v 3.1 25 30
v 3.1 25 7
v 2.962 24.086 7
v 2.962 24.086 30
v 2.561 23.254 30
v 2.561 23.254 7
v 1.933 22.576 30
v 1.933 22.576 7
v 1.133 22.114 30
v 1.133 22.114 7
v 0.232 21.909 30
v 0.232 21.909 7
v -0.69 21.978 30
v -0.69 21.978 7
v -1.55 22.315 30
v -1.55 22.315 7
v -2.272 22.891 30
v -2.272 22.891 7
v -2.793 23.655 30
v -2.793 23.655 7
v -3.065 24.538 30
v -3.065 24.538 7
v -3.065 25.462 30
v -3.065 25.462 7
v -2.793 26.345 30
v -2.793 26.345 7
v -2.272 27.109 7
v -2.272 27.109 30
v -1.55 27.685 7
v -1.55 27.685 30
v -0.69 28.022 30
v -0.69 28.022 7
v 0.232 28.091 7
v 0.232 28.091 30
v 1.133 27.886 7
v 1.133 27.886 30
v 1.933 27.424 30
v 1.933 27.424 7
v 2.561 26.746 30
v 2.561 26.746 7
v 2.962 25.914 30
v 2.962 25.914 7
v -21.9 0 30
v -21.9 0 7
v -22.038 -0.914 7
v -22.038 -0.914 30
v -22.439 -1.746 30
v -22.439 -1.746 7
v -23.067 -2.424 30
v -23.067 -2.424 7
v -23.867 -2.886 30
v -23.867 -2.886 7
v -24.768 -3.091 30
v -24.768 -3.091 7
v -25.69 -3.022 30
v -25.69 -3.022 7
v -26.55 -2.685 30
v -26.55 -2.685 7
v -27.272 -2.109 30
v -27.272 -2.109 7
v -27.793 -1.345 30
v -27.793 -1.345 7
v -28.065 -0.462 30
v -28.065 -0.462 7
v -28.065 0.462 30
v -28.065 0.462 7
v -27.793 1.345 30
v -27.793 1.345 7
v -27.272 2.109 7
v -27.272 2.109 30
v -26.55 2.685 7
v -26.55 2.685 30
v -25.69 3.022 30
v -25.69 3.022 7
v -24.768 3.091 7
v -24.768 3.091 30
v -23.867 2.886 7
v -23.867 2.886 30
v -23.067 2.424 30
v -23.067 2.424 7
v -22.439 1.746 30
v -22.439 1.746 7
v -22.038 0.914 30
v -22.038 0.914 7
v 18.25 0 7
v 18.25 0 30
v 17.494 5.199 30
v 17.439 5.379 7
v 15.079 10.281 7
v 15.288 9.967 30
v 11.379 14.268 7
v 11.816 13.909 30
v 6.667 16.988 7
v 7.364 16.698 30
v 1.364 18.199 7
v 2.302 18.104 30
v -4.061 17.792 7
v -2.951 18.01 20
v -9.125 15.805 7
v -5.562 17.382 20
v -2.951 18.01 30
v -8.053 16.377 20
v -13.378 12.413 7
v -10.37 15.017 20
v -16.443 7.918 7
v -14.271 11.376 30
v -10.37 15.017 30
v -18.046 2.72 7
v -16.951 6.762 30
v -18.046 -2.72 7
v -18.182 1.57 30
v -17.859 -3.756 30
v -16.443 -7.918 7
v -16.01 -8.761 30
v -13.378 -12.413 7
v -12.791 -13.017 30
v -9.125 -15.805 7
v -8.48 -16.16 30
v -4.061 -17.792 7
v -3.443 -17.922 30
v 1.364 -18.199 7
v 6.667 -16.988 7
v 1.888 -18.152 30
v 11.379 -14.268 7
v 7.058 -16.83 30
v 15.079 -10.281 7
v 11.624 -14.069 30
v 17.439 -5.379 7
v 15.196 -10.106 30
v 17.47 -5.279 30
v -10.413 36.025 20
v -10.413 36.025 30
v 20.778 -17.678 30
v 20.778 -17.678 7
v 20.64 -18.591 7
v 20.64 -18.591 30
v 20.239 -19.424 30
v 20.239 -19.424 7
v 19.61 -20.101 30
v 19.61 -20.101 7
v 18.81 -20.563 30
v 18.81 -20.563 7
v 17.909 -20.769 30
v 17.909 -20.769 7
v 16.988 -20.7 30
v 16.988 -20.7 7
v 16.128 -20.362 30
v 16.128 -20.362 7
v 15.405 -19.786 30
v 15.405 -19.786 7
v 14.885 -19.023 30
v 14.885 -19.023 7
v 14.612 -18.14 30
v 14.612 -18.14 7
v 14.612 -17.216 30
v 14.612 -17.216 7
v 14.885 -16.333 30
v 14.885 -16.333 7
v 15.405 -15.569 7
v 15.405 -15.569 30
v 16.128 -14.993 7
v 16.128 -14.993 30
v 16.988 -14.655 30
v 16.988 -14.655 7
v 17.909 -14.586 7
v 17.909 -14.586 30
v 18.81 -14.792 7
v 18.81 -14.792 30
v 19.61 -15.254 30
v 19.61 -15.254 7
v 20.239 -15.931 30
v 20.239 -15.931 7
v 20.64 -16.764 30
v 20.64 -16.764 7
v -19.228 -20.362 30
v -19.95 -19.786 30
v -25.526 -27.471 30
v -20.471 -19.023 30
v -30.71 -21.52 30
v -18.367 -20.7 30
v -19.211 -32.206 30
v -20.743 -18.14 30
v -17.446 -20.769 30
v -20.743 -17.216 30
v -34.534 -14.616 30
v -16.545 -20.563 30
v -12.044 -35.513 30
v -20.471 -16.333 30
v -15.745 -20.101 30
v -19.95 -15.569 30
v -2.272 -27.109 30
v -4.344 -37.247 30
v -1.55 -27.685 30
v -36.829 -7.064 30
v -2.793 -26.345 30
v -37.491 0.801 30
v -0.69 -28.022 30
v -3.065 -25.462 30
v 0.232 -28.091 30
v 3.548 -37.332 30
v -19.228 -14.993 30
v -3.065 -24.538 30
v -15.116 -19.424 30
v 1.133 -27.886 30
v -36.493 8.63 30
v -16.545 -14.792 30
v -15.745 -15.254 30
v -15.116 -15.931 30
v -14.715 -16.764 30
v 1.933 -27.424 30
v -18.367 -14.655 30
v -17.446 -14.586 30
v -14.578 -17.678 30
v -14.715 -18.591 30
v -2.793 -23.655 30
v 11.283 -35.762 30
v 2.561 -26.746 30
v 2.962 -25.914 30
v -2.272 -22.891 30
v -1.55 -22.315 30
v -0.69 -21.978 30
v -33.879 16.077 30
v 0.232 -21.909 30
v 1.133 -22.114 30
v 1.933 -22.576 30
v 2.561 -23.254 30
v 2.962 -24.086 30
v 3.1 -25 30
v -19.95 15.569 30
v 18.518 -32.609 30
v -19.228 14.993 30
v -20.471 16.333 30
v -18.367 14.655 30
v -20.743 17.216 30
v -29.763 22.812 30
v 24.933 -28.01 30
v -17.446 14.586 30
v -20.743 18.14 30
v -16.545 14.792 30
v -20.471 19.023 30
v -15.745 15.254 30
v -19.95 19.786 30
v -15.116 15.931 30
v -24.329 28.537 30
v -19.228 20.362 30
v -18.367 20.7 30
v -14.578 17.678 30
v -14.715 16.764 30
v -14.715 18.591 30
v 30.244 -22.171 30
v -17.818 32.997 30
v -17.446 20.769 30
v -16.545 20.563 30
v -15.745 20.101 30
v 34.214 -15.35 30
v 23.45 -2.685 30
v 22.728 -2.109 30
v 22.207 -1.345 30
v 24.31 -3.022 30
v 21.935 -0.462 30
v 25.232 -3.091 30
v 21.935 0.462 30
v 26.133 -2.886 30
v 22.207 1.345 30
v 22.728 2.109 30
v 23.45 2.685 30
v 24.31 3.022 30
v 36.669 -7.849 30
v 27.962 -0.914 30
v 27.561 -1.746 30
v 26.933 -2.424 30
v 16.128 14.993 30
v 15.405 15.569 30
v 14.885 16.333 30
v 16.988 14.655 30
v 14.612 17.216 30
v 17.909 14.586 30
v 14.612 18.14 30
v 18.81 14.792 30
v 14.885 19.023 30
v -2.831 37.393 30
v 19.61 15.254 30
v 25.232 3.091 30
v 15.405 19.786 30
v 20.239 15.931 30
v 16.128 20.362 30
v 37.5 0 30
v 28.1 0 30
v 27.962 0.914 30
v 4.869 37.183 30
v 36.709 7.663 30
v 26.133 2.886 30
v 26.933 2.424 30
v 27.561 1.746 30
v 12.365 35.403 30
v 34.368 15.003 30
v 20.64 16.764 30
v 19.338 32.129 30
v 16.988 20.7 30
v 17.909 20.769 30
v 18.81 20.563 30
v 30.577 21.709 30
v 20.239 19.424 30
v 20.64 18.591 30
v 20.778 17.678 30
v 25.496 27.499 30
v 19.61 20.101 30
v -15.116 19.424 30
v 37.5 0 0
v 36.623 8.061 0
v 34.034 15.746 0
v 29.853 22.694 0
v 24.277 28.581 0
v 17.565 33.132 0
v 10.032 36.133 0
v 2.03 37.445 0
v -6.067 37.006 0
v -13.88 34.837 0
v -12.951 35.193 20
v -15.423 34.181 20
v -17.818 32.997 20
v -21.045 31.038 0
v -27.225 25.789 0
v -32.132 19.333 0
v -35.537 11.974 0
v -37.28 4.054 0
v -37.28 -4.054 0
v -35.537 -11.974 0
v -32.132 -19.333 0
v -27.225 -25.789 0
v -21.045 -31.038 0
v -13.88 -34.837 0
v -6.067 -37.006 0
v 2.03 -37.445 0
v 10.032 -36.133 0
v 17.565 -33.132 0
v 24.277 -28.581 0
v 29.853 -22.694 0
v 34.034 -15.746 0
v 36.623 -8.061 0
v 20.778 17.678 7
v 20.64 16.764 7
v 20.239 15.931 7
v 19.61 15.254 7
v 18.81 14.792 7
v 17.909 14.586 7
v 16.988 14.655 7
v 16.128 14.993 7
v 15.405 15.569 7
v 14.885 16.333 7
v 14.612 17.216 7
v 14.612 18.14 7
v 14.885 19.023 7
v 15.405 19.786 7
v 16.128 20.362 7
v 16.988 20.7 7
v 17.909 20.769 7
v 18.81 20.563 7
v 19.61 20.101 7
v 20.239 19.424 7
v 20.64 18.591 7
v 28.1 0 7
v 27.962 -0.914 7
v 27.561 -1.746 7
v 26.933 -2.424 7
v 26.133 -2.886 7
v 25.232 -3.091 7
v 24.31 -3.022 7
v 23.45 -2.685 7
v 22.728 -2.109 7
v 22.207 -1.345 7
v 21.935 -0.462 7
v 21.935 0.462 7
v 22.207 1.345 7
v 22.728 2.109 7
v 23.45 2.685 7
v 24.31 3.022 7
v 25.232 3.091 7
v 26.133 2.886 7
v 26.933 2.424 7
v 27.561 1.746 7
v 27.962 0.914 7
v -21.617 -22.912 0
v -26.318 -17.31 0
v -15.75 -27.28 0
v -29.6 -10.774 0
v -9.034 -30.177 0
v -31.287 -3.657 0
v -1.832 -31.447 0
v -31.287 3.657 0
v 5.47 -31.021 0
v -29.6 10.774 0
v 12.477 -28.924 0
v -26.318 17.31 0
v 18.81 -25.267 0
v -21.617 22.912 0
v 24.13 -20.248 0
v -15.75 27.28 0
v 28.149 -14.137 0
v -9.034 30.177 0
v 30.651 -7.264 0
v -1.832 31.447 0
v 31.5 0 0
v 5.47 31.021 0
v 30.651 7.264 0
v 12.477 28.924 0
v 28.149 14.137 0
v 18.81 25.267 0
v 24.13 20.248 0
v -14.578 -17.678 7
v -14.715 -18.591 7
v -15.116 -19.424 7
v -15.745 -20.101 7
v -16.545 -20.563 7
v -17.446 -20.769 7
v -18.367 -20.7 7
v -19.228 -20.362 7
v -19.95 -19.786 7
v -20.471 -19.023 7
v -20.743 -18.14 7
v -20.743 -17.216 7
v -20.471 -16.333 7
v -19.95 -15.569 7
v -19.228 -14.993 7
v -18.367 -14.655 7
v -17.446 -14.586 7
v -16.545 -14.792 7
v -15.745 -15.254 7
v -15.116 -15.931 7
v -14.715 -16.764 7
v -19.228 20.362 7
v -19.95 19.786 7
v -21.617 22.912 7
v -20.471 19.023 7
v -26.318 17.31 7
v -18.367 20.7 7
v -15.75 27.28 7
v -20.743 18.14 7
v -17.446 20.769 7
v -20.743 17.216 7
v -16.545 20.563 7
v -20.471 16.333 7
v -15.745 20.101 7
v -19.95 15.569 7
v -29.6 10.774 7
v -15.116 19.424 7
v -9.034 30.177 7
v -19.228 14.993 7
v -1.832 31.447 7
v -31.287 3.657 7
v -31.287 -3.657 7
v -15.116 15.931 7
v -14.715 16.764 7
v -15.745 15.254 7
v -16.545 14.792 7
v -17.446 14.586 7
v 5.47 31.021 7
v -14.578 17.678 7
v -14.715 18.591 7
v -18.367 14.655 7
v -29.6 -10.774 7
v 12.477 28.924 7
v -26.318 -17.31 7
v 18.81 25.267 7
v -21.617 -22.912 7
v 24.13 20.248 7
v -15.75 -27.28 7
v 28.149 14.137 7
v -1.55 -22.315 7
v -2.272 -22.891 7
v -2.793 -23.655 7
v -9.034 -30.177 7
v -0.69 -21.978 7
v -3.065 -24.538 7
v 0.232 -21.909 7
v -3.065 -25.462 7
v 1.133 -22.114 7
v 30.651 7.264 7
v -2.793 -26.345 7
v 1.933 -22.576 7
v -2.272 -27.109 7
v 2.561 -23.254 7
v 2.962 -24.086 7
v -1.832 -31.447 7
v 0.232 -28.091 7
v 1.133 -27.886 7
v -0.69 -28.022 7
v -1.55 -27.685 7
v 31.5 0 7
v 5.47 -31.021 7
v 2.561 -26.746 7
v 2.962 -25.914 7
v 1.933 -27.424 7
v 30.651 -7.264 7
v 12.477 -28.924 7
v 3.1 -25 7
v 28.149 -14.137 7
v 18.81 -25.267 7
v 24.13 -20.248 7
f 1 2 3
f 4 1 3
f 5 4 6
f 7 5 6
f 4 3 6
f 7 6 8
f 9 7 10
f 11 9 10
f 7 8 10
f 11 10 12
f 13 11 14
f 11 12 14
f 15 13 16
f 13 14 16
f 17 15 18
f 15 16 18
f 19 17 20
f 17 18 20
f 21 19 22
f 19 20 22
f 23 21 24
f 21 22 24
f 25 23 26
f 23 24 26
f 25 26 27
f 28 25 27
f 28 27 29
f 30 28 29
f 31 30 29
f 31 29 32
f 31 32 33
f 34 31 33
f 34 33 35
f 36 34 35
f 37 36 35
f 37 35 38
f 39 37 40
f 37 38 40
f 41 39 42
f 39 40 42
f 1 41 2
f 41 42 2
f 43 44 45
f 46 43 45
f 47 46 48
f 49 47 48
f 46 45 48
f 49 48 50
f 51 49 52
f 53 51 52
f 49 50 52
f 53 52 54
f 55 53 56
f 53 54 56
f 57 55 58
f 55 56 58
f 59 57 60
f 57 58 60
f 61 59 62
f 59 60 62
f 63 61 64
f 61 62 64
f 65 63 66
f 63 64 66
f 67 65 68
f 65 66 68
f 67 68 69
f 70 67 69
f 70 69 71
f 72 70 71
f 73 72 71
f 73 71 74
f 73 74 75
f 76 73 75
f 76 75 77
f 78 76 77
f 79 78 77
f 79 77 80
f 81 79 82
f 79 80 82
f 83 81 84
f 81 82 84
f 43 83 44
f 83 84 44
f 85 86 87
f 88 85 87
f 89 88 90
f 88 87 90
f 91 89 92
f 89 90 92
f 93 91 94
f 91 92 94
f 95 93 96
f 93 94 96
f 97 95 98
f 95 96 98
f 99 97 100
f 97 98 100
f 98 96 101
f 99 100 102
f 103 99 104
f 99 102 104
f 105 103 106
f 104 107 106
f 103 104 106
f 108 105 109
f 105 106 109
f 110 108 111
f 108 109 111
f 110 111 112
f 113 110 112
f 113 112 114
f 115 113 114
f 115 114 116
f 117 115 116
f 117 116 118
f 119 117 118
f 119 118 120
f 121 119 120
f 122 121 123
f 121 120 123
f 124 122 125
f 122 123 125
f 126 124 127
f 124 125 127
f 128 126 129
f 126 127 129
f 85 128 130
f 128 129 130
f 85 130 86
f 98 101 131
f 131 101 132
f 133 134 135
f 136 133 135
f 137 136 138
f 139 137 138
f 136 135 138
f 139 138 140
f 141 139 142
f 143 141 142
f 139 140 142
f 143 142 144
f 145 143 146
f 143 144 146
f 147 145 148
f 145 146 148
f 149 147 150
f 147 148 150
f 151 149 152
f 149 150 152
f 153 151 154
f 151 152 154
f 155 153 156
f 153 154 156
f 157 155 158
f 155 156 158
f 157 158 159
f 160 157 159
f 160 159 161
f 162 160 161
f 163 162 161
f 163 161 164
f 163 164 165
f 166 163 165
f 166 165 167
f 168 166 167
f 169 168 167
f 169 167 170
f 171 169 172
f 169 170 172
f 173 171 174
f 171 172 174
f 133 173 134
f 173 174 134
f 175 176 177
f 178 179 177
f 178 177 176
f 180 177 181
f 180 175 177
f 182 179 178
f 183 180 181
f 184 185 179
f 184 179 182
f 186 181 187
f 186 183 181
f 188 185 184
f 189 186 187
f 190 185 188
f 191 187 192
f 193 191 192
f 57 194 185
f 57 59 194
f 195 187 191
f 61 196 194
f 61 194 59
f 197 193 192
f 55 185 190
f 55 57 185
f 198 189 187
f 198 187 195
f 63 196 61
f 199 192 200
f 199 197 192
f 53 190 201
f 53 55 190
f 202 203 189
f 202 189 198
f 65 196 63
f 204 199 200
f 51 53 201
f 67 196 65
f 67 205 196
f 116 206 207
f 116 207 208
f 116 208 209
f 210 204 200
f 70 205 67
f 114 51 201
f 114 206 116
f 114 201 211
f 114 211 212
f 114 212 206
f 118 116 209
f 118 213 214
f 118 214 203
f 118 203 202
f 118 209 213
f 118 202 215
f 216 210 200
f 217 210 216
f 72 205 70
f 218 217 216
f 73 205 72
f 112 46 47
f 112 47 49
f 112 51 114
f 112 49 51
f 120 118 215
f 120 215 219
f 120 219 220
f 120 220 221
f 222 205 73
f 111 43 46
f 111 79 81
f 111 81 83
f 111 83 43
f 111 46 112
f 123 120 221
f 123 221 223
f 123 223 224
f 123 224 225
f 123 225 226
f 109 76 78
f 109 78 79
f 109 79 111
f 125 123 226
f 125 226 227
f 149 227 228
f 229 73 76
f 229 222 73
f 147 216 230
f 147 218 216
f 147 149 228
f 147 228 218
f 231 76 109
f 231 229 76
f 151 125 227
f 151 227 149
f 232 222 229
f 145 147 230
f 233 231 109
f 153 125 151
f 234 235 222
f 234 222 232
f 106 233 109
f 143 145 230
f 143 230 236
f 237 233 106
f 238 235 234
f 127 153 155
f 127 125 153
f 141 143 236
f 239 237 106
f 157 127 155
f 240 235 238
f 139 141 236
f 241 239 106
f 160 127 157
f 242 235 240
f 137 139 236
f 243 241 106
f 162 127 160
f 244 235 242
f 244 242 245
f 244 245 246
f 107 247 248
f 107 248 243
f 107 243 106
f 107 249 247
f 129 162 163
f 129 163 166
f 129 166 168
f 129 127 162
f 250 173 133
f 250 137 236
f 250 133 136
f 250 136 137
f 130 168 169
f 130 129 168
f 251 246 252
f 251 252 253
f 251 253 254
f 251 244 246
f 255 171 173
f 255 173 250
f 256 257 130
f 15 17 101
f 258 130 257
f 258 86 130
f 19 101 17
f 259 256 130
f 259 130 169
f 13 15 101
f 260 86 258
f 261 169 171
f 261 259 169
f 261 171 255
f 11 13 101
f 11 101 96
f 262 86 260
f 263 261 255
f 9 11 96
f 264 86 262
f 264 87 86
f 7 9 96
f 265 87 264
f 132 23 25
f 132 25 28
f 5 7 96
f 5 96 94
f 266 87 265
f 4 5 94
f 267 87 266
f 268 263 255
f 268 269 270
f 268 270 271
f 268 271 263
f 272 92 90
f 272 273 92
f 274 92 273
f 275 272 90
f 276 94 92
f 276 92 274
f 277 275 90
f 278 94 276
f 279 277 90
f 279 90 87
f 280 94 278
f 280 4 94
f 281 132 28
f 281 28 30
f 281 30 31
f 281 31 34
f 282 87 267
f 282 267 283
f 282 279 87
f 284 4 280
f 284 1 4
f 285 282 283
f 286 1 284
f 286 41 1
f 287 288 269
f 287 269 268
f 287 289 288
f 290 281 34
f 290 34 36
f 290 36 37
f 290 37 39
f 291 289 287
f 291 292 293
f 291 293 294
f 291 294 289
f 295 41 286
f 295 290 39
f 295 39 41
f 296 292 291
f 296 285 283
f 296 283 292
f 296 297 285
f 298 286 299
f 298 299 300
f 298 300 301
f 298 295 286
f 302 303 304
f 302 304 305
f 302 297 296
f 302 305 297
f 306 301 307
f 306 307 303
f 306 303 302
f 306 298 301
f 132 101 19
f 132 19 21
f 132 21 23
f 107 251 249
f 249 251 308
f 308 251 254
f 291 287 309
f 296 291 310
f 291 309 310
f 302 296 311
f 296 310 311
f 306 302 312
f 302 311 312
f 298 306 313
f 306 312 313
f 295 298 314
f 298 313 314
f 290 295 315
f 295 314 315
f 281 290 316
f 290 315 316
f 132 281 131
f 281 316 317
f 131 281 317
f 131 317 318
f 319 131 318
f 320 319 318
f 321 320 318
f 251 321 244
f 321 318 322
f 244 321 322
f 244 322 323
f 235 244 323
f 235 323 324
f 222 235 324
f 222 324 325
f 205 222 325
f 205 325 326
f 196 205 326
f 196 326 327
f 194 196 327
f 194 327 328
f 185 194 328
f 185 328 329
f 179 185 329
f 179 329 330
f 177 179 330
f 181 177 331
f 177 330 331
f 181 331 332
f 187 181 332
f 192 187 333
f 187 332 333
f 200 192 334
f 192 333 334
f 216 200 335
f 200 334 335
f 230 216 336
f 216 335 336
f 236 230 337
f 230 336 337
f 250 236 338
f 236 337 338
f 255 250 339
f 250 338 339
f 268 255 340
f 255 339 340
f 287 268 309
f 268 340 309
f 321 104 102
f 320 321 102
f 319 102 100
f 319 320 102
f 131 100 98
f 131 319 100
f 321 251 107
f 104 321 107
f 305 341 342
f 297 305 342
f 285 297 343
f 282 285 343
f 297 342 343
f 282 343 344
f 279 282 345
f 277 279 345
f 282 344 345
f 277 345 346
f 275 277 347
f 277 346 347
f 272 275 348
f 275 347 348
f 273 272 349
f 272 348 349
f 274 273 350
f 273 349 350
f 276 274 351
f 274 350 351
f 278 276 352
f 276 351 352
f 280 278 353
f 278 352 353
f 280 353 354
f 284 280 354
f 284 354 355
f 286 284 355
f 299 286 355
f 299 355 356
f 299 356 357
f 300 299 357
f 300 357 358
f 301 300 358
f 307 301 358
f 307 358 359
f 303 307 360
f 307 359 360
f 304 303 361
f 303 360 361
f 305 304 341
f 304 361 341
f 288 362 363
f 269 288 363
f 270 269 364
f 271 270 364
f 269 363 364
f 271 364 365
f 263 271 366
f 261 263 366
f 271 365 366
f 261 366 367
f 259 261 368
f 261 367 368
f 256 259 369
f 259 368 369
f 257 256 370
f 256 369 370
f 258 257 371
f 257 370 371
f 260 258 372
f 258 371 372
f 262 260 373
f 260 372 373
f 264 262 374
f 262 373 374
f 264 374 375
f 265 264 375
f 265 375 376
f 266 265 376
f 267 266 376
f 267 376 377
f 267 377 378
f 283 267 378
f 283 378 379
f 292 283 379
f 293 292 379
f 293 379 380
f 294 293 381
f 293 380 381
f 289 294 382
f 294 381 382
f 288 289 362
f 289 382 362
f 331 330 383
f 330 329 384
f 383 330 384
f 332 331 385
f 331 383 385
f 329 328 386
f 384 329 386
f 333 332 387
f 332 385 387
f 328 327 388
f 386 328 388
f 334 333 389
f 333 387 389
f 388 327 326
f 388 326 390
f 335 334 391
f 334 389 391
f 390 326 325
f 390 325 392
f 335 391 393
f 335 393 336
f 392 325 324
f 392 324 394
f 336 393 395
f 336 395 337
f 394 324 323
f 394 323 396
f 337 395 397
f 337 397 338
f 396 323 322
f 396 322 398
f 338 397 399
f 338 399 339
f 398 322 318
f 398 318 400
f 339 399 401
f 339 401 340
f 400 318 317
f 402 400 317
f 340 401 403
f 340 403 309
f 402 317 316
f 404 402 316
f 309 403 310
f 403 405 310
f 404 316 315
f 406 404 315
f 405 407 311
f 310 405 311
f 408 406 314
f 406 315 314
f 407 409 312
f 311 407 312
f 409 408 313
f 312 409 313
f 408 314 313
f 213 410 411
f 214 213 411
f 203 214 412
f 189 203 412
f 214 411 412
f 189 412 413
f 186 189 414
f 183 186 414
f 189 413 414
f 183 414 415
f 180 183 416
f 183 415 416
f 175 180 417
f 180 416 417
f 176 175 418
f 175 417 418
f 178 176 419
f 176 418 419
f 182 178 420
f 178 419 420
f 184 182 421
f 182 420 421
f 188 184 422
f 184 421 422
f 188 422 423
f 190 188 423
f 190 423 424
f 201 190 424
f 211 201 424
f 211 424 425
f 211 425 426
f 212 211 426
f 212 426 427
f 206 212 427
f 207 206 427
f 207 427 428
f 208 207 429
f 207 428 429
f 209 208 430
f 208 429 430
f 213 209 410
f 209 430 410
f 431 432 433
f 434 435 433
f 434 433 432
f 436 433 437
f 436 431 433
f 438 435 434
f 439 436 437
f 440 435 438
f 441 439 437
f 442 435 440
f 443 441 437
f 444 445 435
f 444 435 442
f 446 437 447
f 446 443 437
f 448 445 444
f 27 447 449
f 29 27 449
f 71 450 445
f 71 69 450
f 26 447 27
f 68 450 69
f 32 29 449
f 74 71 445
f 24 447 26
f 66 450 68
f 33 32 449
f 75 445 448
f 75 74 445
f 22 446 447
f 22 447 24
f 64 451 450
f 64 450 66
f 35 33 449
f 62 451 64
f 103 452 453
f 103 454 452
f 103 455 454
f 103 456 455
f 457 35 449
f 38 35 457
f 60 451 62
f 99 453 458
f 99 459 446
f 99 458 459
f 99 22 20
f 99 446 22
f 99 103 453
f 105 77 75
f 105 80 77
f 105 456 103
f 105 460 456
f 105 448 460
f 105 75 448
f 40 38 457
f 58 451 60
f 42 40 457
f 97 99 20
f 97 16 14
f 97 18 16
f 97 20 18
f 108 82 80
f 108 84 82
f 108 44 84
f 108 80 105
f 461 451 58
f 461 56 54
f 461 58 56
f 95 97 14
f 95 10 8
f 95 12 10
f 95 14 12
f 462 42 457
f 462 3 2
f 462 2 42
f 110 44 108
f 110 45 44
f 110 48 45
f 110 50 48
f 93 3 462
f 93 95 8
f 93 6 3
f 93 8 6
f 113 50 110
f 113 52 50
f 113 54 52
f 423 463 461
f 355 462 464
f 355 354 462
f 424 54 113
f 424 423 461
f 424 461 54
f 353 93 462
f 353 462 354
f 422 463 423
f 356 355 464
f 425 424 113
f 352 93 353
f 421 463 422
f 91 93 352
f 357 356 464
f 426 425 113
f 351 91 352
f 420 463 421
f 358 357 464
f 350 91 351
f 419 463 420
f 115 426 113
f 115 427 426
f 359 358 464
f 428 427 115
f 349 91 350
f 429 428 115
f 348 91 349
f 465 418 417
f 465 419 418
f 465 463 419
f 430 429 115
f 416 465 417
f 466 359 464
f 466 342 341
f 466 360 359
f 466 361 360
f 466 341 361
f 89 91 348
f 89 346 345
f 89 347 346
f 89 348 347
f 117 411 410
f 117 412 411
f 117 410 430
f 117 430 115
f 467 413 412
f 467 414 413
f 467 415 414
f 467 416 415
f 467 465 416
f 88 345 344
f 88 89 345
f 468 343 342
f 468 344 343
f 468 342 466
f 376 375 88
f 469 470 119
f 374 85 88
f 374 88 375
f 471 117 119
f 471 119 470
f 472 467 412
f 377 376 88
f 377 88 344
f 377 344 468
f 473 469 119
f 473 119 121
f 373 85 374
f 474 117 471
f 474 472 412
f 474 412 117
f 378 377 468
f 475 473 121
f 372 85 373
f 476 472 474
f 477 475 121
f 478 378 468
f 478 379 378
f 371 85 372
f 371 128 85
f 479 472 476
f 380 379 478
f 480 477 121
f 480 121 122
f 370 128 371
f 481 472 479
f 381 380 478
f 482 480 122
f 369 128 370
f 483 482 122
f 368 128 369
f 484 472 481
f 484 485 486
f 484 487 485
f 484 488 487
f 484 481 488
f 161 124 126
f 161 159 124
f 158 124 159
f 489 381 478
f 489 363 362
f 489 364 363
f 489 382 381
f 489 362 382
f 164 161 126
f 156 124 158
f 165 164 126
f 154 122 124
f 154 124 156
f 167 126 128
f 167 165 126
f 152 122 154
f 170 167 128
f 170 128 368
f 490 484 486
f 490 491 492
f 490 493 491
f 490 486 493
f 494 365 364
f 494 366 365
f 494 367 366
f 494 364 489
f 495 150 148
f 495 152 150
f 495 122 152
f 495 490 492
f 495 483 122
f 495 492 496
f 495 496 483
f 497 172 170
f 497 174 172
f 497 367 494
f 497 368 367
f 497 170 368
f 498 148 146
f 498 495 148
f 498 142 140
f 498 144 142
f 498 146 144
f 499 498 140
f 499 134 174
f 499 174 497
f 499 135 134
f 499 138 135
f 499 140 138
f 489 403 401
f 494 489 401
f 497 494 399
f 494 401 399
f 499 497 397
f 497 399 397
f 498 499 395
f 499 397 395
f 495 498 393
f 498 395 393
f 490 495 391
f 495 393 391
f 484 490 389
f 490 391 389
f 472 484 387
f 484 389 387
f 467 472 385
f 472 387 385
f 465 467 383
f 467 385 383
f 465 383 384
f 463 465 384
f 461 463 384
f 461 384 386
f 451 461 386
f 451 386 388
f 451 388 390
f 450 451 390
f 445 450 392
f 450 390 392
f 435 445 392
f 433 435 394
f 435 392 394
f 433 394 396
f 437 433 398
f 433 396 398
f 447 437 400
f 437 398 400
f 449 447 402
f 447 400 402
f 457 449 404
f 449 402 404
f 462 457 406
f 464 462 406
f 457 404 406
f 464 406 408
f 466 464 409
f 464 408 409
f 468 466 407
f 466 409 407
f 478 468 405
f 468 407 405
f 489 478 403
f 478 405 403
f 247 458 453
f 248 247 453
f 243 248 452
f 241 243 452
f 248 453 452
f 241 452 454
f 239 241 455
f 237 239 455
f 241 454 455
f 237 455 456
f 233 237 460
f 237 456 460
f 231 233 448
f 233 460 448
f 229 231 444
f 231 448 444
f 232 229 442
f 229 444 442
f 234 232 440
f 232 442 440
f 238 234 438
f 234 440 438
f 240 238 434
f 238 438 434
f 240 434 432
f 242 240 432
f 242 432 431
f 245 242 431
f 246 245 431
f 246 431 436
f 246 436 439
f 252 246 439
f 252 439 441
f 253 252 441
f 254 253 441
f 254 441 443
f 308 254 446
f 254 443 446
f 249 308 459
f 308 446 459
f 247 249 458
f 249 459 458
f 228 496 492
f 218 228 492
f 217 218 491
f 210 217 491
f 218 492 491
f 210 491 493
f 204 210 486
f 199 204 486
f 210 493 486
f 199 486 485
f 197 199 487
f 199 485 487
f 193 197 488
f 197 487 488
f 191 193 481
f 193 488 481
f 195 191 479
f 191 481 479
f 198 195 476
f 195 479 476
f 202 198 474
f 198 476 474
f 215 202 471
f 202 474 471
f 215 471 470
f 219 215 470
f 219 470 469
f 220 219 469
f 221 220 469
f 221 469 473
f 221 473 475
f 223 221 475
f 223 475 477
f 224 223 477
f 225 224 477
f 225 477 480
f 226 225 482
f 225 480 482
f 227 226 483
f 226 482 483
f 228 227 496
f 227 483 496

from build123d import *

# Parameters (mm, degrees)
F0_R     = 37.5
F1_DEPTH = 30
F2_R     = 31.5
F3_DEPTH = 7
F4_R     = 3.1
F5_DEPTH = 23
F6_R     = 18.25
F7_DEPTH = 23
F9_DEPTH = 10


with BuildPart() as f1:
    # F0 (on Top) → F1 (new body)
    with BuildSketch(Plane.XY):
        Circle(F0_R)
    extrude(amount=F1_DEPTH)

    # F2 (on face) → F3 (cut)
    with BuildSketch(Plane(origin=(0, 0, 0), x_dir=(1, 0, 0), z_dir=(0, 0, -1))):
        Circle(F2_R)
    extrude(amount=-F3_DEPTH, mode=Mode.SUBTRACT)

    # F4 (on face) → F5 (cut, through all)
    with BuildSketch(Plane(origin=(0, 0, 7), x_dir=(1, 0, 0), z_dir=(0, 0, -1))):
        with Locations((25, 0)):
            Circle(F4_R)
        with Locations((17.6776695297, 17.6776695297)):
            Circle(F4_R)
        with Locations((0, 25)):
            Circle(F4_R)
        with Locations((-17.6776695297, 17.6776695297)):
            Circle(F4_R)
        with Locations((-25, 0)):
            Circle(F4_R)
        with Locations((-17.6776695297, -17.6776695297)):
            Circle(F4_R)
        with Locations((0, -25)):
            Circle(F4_R)
        with Locations((17.6776695297, -17.6776695297)):
            Circle(F4_R)
    extrude(amount=-F5_DEPTH, mode=Mode.SUBTRACT)

    # F6 (on face) → F7 (cut, through all)
    with BuildSketch(Plane.XY.offset(30)):
        Circle(F6_R)
    extrude(amount=-F7_DEPTH, mode=Mode.SUBTRACT)

    # F8 (on face) → F9 (cut)
    with BuildSketch(Plane.XY.offset(30)):
        with BuildLine():
            Line((-2.9506152383, 18.0098964382), (-10.41284244, 36.0253065541))
            ThreePointArc((-10.41284244, 36.0253065541), (-14.1961717752, 34.7090579954), (-17.8175149302, 32.9967598669))
            Line((-17.8175149302, 32.9967598669), (-10.3702066072, 15.0173671103))
            ThreePointArc((-10.3702066072, 15.0173671103), (-6.8264105945, 16.9252065983), (-2.9506152383, 18.0098964382))
        make_face()
    extrude(amount=-F9_DEPTH, mode=Mode.SUBTRACT)


solid = f1.part
